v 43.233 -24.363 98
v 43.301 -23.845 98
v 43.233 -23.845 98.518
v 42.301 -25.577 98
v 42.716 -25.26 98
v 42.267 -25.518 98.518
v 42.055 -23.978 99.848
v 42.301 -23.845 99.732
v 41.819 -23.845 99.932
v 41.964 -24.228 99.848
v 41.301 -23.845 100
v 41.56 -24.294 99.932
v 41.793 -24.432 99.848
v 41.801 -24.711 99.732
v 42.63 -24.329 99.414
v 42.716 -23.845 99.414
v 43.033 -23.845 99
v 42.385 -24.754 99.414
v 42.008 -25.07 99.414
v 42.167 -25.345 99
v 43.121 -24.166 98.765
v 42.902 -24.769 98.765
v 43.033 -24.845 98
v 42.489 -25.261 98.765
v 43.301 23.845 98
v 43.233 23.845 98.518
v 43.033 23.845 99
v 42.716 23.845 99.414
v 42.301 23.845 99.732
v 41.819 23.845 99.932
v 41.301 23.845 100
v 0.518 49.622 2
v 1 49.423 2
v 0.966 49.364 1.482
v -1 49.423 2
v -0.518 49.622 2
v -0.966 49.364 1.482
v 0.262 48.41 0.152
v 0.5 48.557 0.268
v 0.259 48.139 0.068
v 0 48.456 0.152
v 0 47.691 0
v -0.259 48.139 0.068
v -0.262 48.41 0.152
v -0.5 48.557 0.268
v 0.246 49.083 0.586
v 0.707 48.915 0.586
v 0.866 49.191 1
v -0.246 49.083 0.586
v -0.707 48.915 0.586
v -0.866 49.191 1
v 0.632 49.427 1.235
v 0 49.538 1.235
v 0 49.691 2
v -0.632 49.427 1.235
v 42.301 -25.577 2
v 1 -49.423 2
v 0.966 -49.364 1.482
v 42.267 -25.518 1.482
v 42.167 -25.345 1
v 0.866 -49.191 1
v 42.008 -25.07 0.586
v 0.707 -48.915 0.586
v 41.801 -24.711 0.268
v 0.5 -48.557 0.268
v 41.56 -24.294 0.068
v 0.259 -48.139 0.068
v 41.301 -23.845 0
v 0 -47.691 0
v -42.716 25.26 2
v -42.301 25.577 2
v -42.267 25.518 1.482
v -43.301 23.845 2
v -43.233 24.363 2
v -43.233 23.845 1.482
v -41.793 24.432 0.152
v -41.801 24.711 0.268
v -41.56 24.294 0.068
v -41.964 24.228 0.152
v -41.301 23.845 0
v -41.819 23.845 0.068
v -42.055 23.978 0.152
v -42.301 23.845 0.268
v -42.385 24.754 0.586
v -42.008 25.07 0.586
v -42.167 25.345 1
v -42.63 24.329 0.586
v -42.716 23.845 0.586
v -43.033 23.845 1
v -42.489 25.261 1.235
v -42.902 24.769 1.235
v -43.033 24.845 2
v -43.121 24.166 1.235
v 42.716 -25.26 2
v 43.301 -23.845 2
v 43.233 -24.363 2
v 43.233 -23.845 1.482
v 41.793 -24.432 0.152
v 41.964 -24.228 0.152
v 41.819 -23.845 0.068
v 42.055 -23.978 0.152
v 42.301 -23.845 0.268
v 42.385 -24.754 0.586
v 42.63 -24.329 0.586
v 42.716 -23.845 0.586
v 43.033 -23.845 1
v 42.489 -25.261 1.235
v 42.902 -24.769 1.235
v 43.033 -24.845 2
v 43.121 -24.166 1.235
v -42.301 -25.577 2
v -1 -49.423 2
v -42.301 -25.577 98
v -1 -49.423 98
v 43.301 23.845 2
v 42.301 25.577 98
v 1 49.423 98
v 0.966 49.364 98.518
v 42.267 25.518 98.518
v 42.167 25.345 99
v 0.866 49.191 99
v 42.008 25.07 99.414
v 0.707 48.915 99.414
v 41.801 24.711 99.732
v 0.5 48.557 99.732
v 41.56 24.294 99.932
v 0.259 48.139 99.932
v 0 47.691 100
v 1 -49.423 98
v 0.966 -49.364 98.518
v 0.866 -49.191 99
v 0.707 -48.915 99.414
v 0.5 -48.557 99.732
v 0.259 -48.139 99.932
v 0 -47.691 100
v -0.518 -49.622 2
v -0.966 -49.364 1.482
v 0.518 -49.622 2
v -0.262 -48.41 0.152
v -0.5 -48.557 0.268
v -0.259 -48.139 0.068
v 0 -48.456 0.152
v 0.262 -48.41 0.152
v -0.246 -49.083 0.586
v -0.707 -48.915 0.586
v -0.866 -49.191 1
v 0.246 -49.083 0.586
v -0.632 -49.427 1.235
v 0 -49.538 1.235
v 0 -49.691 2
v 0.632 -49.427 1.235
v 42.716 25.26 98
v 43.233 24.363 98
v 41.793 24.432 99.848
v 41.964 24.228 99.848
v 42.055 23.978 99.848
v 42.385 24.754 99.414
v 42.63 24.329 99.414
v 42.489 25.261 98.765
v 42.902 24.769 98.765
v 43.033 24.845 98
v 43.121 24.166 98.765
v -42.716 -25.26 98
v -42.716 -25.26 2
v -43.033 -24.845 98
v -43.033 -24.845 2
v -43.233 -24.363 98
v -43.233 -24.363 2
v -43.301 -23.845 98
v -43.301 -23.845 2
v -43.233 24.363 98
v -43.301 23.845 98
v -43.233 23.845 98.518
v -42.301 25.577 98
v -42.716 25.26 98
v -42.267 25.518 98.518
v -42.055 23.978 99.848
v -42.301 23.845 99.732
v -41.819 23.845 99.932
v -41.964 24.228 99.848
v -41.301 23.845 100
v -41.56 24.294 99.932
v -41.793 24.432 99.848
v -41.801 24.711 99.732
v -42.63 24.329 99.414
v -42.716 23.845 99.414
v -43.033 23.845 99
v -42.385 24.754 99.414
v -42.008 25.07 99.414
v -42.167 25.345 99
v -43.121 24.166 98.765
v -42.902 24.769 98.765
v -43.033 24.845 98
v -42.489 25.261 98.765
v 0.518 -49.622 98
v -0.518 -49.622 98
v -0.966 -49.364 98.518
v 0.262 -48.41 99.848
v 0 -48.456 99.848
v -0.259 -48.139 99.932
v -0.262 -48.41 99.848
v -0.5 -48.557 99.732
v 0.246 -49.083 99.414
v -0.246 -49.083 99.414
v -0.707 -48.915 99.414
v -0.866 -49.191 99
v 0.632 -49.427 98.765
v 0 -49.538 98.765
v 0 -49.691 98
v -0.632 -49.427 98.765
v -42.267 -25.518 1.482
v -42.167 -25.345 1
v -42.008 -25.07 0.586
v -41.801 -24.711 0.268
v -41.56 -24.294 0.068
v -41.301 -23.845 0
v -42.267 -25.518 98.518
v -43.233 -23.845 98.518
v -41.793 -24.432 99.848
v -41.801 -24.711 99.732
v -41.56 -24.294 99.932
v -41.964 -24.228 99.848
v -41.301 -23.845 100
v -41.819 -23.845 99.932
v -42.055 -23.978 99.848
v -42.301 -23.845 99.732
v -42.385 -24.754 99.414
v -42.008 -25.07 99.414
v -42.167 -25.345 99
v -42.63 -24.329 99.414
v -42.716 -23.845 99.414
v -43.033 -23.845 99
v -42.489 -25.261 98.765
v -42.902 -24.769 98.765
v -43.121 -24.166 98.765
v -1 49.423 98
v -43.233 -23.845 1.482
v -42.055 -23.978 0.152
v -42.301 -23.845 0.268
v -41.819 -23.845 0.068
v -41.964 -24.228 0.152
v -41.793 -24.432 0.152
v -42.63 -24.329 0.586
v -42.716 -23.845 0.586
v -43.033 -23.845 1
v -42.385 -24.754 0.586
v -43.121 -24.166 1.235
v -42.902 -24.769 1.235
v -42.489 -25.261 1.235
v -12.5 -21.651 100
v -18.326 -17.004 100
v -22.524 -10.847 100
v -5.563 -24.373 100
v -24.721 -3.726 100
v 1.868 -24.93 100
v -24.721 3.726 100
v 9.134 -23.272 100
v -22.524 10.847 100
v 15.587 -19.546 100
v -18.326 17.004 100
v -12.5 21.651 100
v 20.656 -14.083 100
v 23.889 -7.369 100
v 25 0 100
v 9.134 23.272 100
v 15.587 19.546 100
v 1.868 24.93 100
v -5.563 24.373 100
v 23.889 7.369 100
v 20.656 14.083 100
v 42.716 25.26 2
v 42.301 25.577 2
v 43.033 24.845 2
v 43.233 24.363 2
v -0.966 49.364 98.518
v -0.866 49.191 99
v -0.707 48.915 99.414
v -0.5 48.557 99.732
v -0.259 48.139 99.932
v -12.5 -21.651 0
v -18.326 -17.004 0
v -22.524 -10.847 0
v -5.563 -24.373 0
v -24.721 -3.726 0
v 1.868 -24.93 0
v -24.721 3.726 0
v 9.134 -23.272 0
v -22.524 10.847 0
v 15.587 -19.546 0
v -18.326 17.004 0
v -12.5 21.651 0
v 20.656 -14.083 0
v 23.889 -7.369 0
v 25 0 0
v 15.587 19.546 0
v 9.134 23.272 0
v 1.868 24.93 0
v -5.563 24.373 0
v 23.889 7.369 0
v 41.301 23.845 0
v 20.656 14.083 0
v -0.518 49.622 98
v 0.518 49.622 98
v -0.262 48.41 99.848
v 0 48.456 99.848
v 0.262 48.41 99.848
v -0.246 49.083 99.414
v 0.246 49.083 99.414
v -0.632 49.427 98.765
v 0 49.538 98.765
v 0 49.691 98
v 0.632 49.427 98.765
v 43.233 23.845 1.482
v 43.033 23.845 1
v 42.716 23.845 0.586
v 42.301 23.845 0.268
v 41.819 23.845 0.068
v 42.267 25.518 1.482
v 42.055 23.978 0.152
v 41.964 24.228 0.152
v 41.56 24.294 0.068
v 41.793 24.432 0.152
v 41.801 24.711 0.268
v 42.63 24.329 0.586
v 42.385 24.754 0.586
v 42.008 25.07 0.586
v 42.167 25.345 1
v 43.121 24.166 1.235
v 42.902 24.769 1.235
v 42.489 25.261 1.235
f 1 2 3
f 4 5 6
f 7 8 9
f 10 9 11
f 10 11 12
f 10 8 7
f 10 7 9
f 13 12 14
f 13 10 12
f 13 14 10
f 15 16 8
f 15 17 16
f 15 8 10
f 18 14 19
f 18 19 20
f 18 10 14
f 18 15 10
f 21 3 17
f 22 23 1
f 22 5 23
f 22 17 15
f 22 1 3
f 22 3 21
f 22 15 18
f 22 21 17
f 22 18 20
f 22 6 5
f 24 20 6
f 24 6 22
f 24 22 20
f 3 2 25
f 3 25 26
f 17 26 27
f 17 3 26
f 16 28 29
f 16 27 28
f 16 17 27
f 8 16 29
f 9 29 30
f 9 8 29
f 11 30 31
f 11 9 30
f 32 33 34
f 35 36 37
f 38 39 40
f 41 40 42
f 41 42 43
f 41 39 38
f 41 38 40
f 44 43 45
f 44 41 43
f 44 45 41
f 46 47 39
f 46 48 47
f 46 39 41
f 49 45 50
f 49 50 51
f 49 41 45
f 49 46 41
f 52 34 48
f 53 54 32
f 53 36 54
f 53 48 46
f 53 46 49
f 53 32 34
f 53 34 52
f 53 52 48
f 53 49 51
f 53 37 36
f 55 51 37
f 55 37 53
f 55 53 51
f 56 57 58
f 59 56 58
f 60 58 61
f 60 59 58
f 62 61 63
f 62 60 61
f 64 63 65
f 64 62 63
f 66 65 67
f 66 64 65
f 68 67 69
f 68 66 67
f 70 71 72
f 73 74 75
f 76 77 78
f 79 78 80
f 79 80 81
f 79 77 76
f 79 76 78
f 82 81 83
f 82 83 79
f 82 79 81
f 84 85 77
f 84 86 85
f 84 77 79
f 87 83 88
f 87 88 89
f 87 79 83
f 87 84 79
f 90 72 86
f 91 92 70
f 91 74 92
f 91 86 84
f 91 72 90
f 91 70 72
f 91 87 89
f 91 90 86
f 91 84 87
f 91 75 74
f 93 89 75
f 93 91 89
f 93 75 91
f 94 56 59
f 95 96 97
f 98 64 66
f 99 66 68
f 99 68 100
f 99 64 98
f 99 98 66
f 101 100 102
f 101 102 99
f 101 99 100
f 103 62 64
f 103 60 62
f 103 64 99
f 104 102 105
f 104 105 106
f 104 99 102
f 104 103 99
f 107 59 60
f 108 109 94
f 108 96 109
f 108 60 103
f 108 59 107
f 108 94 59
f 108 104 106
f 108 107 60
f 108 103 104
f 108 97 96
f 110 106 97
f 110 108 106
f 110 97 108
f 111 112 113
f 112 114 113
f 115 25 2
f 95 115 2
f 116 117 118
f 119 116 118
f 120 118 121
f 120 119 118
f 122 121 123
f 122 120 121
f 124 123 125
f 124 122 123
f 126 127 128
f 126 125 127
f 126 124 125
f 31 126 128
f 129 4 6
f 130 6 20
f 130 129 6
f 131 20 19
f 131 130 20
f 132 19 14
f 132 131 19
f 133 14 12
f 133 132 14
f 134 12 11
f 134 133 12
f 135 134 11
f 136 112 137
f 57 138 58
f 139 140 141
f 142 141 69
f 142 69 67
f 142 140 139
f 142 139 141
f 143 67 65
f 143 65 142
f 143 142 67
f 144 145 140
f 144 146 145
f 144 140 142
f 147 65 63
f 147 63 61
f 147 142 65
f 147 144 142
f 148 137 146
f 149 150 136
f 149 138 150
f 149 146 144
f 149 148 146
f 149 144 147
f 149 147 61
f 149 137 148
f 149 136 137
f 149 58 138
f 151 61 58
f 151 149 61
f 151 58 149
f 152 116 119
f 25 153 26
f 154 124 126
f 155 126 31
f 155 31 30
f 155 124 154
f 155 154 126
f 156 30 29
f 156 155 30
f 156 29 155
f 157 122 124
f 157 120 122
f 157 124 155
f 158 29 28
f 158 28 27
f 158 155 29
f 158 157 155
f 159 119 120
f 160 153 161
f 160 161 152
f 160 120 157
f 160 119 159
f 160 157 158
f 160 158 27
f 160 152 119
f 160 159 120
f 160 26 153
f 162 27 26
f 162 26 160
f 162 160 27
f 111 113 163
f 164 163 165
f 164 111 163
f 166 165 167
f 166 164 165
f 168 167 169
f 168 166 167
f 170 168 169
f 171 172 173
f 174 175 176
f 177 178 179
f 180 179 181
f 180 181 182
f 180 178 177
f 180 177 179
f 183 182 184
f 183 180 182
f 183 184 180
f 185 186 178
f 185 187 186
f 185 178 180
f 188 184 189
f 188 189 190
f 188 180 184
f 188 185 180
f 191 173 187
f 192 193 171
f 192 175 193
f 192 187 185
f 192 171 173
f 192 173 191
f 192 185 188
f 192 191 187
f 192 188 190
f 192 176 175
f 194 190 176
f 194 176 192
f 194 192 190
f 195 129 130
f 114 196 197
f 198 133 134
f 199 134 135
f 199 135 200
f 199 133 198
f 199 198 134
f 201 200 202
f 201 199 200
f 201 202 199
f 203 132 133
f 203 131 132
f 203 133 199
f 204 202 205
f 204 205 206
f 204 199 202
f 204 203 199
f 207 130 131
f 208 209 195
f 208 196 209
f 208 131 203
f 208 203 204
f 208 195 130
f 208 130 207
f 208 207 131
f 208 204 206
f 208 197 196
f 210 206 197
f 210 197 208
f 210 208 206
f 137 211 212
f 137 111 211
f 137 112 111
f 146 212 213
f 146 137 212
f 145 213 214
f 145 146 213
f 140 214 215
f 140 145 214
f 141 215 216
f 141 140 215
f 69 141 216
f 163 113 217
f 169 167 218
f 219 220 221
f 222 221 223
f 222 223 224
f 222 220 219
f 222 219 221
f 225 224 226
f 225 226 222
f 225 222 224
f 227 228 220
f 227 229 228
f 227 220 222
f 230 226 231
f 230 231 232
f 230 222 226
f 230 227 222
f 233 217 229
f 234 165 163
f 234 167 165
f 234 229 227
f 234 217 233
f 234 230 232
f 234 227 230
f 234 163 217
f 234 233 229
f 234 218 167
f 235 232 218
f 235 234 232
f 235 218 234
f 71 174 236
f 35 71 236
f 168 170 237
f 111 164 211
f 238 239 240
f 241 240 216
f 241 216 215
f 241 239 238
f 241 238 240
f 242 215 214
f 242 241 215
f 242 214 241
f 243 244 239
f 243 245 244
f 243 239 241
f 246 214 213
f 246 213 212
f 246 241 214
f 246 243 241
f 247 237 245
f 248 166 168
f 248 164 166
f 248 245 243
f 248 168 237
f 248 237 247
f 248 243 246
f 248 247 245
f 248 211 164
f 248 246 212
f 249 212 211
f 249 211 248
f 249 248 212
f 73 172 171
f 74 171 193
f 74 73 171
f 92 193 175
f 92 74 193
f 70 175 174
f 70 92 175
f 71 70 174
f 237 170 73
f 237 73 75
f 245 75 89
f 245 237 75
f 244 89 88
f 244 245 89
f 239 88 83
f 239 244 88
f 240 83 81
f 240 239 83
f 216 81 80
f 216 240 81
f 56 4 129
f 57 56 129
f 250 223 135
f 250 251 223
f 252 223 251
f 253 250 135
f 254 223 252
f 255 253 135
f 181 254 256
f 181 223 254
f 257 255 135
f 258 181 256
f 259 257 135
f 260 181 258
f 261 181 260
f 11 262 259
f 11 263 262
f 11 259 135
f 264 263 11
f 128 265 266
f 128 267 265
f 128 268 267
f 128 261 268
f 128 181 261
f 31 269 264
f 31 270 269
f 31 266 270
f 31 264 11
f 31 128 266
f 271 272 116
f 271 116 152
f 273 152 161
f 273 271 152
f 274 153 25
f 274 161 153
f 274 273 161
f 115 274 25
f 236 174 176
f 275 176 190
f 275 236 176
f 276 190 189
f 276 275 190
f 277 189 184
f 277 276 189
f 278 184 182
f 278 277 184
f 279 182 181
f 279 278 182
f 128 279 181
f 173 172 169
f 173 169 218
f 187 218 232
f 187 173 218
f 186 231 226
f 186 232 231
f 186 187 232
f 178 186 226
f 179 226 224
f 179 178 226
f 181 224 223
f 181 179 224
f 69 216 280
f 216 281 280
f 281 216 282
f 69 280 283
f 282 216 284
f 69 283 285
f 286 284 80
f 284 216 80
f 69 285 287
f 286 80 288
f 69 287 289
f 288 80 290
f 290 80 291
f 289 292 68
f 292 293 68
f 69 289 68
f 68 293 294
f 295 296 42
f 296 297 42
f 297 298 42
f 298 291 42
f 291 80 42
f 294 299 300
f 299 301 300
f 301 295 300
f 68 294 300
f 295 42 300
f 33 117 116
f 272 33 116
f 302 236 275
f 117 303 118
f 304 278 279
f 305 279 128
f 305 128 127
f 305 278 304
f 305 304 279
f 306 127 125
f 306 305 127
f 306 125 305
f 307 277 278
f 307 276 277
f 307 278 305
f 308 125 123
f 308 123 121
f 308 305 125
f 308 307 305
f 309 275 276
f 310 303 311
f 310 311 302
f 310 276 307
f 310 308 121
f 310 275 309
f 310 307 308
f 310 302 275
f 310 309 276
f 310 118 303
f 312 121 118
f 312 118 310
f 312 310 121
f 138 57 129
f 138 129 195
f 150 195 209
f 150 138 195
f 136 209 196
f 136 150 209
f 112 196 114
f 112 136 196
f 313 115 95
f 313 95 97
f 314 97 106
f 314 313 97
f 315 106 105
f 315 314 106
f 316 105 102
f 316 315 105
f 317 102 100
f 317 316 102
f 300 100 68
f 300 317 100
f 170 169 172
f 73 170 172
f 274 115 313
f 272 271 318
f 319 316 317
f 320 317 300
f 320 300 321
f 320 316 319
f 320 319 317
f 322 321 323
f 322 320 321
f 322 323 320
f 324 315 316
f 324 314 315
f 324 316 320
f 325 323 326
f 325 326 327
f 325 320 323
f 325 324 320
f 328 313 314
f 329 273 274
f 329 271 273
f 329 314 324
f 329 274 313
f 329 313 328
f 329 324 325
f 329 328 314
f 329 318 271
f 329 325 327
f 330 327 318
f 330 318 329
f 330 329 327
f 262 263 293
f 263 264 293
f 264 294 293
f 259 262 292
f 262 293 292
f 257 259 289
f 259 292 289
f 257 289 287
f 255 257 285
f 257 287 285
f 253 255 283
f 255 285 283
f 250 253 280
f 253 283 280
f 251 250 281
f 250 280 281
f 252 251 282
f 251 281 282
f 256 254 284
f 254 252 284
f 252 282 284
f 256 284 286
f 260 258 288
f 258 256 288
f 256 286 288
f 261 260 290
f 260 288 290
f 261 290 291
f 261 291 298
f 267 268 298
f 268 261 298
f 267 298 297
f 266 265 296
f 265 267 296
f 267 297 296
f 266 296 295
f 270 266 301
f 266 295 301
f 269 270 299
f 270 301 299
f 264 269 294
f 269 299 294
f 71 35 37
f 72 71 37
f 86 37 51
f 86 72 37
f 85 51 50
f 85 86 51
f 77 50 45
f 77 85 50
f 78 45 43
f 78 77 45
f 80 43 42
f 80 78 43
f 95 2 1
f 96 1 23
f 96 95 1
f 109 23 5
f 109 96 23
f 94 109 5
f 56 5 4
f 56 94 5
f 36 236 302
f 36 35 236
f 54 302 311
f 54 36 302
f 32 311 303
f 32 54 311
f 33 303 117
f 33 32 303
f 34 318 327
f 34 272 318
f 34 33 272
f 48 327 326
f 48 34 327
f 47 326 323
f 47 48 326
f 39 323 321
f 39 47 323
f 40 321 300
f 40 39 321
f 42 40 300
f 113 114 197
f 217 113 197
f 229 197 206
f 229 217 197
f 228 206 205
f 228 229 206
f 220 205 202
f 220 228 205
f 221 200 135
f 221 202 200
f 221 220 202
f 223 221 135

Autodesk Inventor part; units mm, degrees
ref_plane "YZ Plane" through (0, 0, 0) normal (1, 0, 0) x (0, 1, 0)
ref_plane "XZ Plane" through (0, 0, 0) normal (0, 1, 0) x (-1, 0, 0)
ref_plane "XY Plane" through (0, 0, 0) normal (0, 0, 1) x (1, 0, 0)
sketch "Sketch1" plane through (0, 0, 0) normal (0, 0, 1) x (1, 0, 0)
  circle A0 centre (0, 0) radius 50
  circle A1 centre (0, 0) radius 25
  dimension "d0" = 100
  dimension "d1" = 50
extrude "Extrusion1" add sketch "Sketch1" along normal blind 100
sketch "Sketch2" plane through (0, 0, 100) normal (0, 0, 1) x (1, 0, 0)
  circle A0 centre (0, 0) radius 50 projected
  line L0 (0, 50) -> (43.3013, 25)
  line L1 (43.3013, 25) -> (43.3013, -25)
  line L2 (43.3013, -25) -> (0, -50)
  line L3 (0, -50) -> (-43.3013, -25)
  line L4 (-43.3013, -25) -> (-43.3013, 25)
  line L5 (-43.3013, 25) -> (0, 50)
  circle A1 centre (0, 0) radius 50
  dimension "d4" = 0
extrude "Extrusion2" cut sketch "Sketch2" against normal blind 100 contours A0 L1 | L0 A0 | A0 L2 | L5 A0 | A0 L3 | L4 A0
fillet "Fillet1" radius 2 12 edges at (0, 50, 50) (21.6506, 37.5, 100) (-21.6506, 37.5, 100) (43.3013, 25, 50) (43.3013, -25, 50) (43.3013, 0, 100) (-43.3013, 25, 50) (-43.3013, 0, 100) (-43.3013, -25, 50) (-21.6506, -37.5, 100) (0, -50, 50) (21.6506, -37.5, 100)
fillet "Fillet2" radius 2 12 edges at (0, 49.6906, 0) (21.6506, 37.5, 0) (43.0333, 24.8453, 0) (43.3013, 0, 0) (43.0333, -24.8453, 0) (21.6506, -37.5, 0) (0, -49.6906, 0) (-21.6506, -37.5, 0) (-43.0333, -24.8453, 0) (-43.3013, 0, 0) (-43.0333, 24.8453, 0) (-21.6506, 37.5, 0)
properties part number "Nut" material "Iron, Malleable"
